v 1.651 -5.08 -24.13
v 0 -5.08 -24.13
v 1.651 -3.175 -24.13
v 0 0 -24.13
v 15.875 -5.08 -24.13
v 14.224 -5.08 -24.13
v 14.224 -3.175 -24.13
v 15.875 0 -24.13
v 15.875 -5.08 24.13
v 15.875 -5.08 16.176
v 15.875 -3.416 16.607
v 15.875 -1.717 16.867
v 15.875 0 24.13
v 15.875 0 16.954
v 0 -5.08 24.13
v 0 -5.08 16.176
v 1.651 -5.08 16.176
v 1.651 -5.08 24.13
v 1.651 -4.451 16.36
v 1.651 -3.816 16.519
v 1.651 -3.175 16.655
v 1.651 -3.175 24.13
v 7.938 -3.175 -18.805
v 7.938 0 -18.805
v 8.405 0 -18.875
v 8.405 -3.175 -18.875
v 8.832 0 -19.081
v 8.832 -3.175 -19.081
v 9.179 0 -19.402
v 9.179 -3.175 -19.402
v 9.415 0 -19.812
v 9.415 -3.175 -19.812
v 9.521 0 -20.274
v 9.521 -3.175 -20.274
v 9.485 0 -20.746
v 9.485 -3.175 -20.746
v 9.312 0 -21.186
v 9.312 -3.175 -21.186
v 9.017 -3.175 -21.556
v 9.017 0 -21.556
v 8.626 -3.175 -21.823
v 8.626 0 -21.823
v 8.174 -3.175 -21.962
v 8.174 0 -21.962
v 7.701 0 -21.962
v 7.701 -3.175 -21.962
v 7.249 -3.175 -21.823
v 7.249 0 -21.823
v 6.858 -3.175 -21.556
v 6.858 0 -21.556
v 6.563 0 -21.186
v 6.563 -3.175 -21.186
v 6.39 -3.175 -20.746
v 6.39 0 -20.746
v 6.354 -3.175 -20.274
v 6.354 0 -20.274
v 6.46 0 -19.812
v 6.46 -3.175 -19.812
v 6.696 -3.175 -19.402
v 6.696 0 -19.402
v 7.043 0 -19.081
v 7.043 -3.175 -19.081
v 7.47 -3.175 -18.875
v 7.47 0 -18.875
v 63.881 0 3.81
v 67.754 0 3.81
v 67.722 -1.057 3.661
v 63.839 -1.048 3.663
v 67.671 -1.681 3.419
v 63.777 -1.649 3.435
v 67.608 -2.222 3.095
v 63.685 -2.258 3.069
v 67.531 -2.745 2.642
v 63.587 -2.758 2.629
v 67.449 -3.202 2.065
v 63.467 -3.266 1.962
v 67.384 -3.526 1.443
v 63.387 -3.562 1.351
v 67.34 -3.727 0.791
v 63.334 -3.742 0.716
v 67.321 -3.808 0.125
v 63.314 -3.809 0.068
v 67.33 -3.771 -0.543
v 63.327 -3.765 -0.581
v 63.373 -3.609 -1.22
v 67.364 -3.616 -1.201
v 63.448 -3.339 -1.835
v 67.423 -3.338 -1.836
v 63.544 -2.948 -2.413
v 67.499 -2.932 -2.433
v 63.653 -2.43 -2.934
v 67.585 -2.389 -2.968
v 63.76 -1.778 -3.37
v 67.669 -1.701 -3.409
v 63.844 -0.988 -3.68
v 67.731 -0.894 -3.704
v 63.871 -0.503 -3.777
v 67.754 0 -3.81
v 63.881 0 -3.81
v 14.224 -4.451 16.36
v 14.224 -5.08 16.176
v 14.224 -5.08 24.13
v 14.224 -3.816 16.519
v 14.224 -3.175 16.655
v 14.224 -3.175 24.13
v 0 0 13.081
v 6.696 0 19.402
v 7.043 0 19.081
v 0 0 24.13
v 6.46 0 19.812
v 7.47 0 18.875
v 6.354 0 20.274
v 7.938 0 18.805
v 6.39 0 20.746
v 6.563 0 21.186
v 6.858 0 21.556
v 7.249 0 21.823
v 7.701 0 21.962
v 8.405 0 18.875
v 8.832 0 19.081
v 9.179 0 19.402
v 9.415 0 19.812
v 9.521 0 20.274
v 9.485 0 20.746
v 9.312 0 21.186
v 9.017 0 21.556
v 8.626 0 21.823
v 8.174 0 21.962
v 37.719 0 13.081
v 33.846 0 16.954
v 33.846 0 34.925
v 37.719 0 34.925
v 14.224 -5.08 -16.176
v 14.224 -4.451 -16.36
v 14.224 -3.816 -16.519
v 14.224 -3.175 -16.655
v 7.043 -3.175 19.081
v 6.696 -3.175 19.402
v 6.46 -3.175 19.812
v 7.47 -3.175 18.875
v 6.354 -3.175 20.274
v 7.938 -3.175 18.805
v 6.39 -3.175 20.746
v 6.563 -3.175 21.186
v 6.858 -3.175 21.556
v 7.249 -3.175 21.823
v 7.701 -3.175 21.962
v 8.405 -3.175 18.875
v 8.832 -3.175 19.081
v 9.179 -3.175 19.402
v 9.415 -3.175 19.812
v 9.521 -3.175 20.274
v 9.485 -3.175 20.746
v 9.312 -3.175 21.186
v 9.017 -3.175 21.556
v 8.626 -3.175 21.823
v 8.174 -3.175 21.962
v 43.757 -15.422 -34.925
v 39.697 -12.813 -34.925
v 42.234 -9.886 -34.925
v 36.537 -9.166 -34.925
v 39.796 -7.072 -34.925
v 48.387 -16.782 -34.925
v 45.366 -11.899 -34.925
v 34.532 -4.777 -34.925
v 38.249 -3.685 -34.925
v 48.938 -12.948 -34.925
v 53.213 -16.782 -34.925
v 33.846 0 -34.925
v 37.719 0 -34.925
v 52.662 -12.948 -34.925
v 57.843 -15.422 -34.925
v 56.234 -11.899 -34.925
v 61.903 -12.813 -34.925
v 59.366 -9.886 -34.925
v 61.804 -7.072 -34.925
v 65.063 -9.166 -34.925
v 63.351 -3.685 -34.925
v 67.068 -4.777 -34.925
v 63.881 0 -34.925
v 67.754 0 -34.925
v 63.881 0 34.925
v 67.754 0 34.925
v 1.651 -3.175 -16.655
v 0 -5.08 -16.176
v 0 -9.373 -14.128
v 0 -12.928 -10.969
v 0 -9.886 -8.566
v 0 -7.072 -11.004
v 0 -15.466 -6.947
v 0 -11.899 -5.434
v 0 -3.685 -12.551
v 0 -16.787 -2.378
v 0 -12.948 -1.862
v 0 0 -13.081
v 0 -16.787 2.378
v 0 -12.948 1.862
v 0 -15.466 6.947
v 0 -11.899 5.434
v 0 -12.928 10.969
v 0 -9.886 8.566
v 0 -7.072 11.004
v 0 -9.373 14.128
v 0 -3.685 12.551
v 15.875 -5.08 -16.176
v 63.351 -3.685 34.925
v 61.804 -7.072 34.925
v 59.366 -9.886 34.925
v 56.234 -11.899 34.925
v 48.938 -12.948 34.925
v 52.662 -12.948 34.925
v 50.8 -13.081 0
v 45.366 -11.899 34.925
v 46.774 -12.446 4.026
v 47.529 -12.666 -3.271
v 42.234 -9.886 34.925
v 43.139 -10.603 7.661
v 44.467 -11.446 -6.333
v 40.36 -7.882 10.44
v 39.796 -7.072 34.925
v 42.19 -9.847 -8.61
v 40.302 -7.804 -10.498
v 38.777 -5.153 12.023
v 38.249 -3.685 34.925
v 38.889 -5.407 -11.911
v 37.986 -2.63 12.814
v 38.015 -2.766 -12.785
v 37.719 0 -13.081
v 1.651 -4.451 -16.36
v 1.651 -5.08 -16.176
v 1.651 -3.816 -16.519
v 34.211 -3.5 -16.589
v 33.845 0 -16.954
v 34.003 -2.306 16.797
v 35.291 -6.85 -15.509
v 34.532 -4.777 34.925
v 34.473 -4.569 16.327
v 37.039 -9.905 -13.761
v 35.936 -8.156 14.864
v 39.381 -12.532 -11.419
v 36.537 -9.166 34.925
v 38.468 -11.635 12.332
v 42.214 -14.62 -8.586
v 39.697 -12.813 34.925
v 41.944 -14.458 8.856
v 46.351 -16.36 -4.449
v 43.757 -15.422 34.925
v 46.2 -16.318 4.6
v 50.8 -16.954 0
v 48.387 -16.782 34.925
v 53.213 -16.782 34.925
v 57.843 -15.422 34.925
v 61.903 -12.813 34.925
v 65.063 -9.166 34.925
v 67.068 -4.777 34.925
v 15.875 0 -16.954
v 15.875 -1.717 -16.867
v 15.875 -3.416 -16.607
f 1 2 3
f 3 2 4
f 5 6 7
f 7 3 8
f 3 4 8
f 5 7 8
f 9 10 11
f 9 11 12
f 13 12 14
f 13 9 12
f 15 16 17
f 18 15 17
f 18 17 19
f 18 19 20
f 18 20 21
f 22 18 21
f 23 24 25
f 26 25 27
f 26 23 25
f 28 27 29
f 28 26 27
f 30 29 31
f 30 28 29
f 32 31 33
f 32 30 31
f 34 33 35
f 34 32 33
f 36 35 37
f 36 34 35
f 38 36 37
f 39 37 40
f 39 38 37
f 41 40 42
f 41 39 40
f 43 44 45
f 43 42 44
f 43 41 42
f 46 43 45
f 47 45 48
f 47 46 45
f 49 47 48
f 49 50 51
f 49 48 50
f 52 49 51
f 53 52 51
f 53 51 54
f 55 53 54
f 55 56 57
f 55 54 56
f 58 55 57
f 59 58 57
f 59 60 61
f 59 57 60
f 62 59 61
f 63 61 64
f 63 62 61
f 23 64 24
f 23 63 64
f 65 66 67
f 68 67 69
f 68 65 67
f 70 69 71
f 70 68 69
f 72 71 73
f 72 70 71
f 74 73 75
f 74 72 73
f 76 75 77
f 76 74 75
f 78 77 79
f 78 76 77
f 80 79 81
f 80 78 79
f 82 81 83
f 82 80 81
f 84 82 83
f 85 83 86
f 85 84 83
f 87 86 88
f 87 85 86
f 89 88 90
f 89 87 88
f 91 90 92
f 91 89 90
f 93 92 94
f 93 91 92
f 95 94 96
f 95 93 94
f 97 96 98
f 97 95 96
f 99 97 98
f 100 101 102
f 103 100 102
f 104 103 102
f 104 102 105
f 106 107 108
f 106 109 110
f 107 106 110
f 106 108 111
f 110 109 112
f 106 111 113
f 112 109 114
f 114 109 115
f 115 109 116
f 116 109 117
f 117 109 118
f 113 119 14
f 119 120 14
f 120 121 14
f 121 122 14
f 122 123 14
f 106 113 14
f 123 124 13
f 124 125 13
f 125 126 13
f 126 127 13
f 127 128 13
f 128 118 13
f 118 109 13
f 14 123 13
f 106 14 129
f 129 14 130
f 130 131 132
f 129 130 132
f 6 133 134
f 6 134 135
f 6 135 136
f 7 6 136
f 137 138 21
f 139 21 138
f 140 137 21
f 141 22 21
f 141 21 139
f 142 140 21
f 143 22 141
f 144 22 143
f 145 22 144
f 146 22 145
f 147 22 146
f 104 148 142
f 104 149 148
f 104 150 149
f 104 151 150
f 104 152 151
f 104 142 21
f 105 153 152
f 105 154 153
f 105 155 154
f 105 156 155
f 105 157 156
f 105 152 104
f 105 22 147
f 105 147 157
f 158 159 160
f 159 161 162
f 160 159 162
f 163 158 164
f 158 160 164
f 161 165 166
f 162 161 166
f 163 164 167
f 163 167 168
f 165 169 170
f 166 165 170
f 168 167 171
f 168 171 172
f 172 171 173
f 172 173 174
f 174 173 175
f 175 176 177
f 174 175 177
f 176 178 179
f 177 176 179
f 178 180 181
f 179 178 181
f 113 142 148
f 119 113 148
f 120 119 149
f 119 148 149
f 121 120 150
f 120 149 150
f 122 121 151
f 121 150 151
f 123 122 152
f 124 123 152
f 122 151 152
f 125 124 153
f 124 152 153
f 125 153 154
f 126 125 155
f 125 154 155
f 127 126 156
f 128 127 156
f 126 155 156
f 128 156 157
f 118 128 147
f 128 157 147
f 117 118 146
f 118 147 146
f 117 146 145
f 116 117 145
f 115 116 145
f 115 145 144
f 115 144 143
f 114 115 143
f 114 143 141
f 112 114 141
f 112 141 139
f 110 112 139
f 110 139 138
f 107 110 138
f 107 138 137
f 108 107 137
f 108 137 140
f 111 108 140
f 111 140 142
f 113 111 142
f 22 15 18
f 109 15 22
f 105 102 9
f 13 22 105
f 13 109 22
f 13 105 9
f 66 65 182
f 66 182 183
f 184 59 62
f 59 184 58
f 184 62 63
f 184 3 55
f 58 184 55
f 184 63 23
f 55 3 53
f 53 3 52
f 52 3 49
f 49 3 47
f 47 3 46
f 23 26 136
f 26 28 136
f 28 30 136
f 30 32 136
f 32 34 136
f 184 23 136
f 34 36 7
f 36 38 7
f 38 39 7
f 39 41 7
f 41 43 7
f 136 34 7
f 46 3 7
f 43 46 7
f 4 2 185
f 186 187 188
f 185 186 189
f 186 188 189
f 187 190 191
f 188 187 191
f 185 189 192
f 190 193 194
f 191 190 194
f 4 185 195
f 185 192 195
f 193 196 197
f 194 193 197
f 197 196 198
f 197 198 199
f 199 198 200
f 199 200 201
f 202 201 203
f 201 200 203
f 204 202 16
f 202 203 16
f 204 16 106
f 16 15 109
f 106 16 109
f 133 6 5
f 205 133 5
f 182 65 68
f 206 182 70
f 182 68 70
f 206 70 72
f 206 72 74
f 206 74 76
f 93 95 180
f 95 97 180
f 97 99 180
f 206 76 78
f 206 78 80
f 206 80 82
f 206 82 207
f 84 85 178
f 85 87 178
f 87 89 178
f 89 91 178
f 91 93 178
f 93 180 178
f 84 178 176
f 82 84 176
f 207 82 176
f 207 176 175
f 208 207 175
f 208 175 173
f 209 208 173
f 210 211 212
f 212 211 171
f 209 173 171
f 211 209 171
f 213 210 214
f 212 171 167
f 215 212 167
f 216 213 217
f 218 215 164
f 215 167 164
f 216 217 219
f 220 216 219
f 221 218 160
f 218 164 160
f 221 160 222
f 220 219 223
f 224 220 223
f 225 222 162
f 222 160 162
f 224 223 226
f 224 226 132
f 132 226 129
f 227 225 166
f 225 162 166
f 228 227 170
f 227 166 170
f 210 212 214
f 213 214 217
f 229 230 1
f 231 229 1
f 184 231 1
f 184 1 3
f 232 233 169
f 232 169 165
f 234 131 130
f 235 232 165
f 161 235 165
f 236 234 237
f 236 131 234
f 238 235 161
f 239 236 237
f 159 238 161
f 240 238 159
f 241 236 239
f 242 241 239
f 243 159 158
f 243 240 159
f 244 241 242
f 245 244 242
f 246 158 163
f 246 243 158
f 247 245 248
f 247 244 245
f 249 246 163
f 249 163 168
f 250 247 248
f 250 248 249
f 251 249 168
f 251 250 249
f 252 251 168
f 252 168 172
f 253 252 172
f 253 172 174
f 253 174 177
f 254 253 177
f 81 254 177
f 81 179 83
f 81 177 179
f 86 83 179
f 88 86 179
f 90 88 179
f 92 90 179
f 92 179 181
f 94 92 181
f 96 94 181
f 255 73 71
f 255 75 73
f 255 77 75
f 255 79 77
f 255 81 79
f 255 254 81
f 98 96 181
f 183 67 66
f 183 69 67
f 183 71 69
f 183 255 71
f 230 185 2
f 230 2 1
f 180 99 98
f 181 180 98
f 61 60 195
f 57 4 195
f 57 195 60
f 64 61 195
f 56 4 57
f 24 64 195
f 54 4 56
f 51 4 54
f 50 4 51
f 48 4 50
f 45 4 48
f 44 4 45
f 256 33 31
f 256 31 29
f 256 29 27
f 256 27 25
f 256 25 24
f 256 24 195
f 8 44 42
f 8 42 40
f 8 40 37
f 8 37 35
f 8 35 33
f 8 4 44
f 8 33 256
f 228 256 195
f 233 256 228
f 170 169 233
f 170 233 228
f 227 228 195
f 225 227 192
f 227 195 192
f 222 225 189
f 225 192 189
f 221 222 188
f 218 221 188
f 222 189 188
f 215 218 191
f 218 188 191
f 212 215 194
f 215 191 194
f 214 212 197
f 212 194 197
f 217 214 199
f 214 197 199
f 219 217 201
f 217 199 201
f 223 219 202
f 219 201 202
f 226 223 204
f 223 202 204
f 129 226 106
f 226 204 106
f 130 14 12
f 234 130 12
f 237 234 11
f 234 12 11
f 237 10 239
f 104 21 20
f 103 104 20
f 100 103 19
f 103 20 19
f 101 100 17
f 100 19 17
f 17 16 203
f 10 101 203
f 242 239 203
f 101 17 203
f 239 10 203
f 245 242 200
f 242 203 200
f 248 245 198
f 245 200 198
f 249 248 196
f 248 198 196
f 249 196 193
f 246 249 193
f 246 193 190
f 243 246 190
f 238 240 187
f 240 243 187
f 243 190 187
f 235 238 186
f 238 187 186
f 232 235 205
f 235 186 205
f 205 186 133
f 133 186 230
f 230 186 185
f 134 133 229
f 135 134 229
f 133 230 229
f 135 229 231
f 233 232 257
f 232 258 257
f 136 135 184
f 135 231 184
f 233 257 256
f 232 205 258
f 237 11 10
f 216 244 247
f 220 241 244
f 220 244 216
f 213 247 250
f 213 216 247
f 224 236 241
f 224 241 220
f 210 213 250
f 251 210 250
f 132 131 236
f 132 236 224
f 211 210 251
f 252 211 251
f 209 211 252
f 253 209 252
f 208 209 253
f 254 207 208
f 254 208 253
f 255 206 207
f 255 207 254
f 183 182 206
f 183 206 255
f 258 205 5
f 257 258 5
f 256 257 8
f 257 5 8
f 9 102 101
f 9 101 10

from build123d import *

# Parameters (mm, degrees)
SKETCH1_R                = 16.9545
BOSS_EXTRUDE1_DEPTH      = 50.8
SKETCH2_R                = 16.9545
BOSS_EXTRUDE2_DEPTH      = 34.925
SKETCH3_R                = 13.081
CUT_EXTRUDE1_DEPTH       = 50.8
SKETCH5_R                = 13.081
CUT_EXTRUDE2_DEPTH       = 69.85
CUT_EXTRUDE4_DEPTH       = 79.088942658
CUT_EXTRUDE4_DEPTH_BACK  = 79.088942658
SKETCH6_R                = 3.81
BOSS_EXTRUDE3_REACH      = 93.464
BOSS_EXTRUDE3_END_RADIUS = 16.9545
SKETCH8_W                = 15.875
SKETCH8_H                = 5.08
CUT_EXTRUDE5_REACH       = 93.464
CUT_EXTRUDE5_END_RADIUS  = 16.9545
SKETCH9_W                = 12.573
SKETCH9_H                = 1.905
SKETCH10_R               = 1.5875
CUT_EXTRUDE6_DEPTH       = 78.461619779


with BuildPart() as part:
    # Sketch1 → Boss-Extrude1 (new body)
    with BuildSketch(Plane(origin=(0, 0, 0), x_dir=(0, 0, -1), z_dir=(1, 0, 0))):
        Circle(SKETCH1_R)
    extrude(amount=BOSS_EXTRUDE1_DEPTH)

    # Sketch2 → Boss-Extrude2 (add, symmetric)
    with BuildSketch(Plane.XY):
        with Locations((50.8, 0)):
            Circle(SKETCH2_R)
    extrude(amount=BOSS_EXTRUDE2_DEPTH, both=True)

    # Sketch3 → Cut-Extrude1 (cut)
    with BuildSketch(Plane.ZY):
        Circle(SKETCH3_R)
    extrude(amount=-CUT_EXTRUDE1_DEPTH, mode=Mode.SUBTRACT)

    # Sketch5 → Cut-Extrude2 (cut)
    with BuildSketch(Plane(origin=(0, 0, -34.925), x_dir=(-1, 0, 0), z_dir=(0, 0, -1))):
        with Locations((-50.8, 0)):
            Circle(SKETCH5_R)
    extrude(amount=-CUT_EXTRUDE2_DEPTH, mode=Mode.SUBTRACT)

    # Sketch6 → Cut-Extrude4 (cut, two sides: drawn at the far end of the back side and taken through both)
    with BuildSketch(Plane(origin=(0, 0, 0), x_dir=(0, 0, -1), z_dir=(1, 0, 0)).offset(-CUT_EXTRUDE4_DEPTH_BACK)):
        with Locations(Location((0, 0, 0), (0, 0, 180))):
            Circle(SKETCH6_R)
    extrude(amount=CUT_EXTRUDE4_DEPTH + CUT_EXTRUDE4_DEPTH_BACK, mode=Mode.SUBTRACT)

    # SurfaceCut1
    split(bisect_by=Plane(origin=(0, 0, 0), x_dir=(1, 0, 0), z_dir=(0, 1, 0)), keep=Keep.BOTTOM)


with BuildPart() as body_2:
    # Boss-Extrude3: up to this cylinder (the profile starts outside it)
    boss_extrude3_end = Plane(origin=(7.9375, 0, 0), z_dir=(-1, 0, 0)) * Cylinder(BOSS_EXTRUDE3_END_RADIUS, 221.837, mode=Mode.PRIVATE)
    # Sketch8 → Boss-Extrude3 (new, up to the surface)
    with BuildSketch(Plane.XY.offset(24.13), mode=Mode.PRIVATE) as boss_extrude3_sk1:
        with Locations((7.9375, -2.54)):
            Rectangle(SKETCH8_W, SKETCH8_H)
    boss_extrude3_tool1 = extrude(boss_extrude3_sk1.sketch, amount=-BOSS_EXTRUDE3_REACH, mode=Mode.PRIVATE) - boss_extrude3_end
    add(boss_extrude3_tool1.solids().sort_by_distance((7.9375, -2.54, 24.13))[0])

    # Cut-Extrude5: up to this cylinder (the profile starts outside it)
    cut_extrude5_end = Plane(origin=(7.9375, 0, 0), z_dir=(-1, 0, 0)) * Cylinder(CUT_EXTRUDE5_END_RADIUS, 221.837, mode=Mode.PRIVATE)
    # Sketch9 → Cut-Extrude5 (cut, up to the surface)
    with BuildSketch(Plane.XY.offset(24.13), mode=Mode.PRIVATE) as cut_extrude5_sk1:
        with Locations((7.9375, -4.1275)):
            Rectangle(SKETCH9_W, SKETCH9_H)
    cut_extrude5_tool1 = extrude(cut_extrude5_sk1.sketch, amount=-CUT_EXTRUDE5_REACH, mode=Mode.PRIVATE) - cut_extrude5_end
    add(cut_extrude5_tool1.solids().sort_by_distance((7.9375, -4.1275, 24.13))[0], mode=Mode.SUBTRACT)


with BuildPart() as body_3:
    # Mirror1: mirrored copy
    add(body_2.part.mirror(Plane.XY))


with BuildPart() as part_1:
    add(part.part)

    # Intersect1: read off the stored shape, not the designer's step
    # Intersect1: union body 3, body 2
    add(body_3.part)
    add(body_2.part)

    # Sketch10 → Cut-Extrude6 (cut, through all)
    with BuildSketch(Plane.XZ.offset(3.175)):
        with Locations(Location((7.9375, 20.392281148, 0), (0, 0, 270))):
            Circle(SKETCH10_R)
    cut_extrude6 = extrude(amount=-CUT_EXTRUDE6_DEPTH, mode=Mode.SUBTRACT)

    # Mirror2: Cut-Extrude6 across plane
    add(cut_extrude6.mirror(Plane.XY), mode=Mode.SUBTRACT)


solid = part_1.part
